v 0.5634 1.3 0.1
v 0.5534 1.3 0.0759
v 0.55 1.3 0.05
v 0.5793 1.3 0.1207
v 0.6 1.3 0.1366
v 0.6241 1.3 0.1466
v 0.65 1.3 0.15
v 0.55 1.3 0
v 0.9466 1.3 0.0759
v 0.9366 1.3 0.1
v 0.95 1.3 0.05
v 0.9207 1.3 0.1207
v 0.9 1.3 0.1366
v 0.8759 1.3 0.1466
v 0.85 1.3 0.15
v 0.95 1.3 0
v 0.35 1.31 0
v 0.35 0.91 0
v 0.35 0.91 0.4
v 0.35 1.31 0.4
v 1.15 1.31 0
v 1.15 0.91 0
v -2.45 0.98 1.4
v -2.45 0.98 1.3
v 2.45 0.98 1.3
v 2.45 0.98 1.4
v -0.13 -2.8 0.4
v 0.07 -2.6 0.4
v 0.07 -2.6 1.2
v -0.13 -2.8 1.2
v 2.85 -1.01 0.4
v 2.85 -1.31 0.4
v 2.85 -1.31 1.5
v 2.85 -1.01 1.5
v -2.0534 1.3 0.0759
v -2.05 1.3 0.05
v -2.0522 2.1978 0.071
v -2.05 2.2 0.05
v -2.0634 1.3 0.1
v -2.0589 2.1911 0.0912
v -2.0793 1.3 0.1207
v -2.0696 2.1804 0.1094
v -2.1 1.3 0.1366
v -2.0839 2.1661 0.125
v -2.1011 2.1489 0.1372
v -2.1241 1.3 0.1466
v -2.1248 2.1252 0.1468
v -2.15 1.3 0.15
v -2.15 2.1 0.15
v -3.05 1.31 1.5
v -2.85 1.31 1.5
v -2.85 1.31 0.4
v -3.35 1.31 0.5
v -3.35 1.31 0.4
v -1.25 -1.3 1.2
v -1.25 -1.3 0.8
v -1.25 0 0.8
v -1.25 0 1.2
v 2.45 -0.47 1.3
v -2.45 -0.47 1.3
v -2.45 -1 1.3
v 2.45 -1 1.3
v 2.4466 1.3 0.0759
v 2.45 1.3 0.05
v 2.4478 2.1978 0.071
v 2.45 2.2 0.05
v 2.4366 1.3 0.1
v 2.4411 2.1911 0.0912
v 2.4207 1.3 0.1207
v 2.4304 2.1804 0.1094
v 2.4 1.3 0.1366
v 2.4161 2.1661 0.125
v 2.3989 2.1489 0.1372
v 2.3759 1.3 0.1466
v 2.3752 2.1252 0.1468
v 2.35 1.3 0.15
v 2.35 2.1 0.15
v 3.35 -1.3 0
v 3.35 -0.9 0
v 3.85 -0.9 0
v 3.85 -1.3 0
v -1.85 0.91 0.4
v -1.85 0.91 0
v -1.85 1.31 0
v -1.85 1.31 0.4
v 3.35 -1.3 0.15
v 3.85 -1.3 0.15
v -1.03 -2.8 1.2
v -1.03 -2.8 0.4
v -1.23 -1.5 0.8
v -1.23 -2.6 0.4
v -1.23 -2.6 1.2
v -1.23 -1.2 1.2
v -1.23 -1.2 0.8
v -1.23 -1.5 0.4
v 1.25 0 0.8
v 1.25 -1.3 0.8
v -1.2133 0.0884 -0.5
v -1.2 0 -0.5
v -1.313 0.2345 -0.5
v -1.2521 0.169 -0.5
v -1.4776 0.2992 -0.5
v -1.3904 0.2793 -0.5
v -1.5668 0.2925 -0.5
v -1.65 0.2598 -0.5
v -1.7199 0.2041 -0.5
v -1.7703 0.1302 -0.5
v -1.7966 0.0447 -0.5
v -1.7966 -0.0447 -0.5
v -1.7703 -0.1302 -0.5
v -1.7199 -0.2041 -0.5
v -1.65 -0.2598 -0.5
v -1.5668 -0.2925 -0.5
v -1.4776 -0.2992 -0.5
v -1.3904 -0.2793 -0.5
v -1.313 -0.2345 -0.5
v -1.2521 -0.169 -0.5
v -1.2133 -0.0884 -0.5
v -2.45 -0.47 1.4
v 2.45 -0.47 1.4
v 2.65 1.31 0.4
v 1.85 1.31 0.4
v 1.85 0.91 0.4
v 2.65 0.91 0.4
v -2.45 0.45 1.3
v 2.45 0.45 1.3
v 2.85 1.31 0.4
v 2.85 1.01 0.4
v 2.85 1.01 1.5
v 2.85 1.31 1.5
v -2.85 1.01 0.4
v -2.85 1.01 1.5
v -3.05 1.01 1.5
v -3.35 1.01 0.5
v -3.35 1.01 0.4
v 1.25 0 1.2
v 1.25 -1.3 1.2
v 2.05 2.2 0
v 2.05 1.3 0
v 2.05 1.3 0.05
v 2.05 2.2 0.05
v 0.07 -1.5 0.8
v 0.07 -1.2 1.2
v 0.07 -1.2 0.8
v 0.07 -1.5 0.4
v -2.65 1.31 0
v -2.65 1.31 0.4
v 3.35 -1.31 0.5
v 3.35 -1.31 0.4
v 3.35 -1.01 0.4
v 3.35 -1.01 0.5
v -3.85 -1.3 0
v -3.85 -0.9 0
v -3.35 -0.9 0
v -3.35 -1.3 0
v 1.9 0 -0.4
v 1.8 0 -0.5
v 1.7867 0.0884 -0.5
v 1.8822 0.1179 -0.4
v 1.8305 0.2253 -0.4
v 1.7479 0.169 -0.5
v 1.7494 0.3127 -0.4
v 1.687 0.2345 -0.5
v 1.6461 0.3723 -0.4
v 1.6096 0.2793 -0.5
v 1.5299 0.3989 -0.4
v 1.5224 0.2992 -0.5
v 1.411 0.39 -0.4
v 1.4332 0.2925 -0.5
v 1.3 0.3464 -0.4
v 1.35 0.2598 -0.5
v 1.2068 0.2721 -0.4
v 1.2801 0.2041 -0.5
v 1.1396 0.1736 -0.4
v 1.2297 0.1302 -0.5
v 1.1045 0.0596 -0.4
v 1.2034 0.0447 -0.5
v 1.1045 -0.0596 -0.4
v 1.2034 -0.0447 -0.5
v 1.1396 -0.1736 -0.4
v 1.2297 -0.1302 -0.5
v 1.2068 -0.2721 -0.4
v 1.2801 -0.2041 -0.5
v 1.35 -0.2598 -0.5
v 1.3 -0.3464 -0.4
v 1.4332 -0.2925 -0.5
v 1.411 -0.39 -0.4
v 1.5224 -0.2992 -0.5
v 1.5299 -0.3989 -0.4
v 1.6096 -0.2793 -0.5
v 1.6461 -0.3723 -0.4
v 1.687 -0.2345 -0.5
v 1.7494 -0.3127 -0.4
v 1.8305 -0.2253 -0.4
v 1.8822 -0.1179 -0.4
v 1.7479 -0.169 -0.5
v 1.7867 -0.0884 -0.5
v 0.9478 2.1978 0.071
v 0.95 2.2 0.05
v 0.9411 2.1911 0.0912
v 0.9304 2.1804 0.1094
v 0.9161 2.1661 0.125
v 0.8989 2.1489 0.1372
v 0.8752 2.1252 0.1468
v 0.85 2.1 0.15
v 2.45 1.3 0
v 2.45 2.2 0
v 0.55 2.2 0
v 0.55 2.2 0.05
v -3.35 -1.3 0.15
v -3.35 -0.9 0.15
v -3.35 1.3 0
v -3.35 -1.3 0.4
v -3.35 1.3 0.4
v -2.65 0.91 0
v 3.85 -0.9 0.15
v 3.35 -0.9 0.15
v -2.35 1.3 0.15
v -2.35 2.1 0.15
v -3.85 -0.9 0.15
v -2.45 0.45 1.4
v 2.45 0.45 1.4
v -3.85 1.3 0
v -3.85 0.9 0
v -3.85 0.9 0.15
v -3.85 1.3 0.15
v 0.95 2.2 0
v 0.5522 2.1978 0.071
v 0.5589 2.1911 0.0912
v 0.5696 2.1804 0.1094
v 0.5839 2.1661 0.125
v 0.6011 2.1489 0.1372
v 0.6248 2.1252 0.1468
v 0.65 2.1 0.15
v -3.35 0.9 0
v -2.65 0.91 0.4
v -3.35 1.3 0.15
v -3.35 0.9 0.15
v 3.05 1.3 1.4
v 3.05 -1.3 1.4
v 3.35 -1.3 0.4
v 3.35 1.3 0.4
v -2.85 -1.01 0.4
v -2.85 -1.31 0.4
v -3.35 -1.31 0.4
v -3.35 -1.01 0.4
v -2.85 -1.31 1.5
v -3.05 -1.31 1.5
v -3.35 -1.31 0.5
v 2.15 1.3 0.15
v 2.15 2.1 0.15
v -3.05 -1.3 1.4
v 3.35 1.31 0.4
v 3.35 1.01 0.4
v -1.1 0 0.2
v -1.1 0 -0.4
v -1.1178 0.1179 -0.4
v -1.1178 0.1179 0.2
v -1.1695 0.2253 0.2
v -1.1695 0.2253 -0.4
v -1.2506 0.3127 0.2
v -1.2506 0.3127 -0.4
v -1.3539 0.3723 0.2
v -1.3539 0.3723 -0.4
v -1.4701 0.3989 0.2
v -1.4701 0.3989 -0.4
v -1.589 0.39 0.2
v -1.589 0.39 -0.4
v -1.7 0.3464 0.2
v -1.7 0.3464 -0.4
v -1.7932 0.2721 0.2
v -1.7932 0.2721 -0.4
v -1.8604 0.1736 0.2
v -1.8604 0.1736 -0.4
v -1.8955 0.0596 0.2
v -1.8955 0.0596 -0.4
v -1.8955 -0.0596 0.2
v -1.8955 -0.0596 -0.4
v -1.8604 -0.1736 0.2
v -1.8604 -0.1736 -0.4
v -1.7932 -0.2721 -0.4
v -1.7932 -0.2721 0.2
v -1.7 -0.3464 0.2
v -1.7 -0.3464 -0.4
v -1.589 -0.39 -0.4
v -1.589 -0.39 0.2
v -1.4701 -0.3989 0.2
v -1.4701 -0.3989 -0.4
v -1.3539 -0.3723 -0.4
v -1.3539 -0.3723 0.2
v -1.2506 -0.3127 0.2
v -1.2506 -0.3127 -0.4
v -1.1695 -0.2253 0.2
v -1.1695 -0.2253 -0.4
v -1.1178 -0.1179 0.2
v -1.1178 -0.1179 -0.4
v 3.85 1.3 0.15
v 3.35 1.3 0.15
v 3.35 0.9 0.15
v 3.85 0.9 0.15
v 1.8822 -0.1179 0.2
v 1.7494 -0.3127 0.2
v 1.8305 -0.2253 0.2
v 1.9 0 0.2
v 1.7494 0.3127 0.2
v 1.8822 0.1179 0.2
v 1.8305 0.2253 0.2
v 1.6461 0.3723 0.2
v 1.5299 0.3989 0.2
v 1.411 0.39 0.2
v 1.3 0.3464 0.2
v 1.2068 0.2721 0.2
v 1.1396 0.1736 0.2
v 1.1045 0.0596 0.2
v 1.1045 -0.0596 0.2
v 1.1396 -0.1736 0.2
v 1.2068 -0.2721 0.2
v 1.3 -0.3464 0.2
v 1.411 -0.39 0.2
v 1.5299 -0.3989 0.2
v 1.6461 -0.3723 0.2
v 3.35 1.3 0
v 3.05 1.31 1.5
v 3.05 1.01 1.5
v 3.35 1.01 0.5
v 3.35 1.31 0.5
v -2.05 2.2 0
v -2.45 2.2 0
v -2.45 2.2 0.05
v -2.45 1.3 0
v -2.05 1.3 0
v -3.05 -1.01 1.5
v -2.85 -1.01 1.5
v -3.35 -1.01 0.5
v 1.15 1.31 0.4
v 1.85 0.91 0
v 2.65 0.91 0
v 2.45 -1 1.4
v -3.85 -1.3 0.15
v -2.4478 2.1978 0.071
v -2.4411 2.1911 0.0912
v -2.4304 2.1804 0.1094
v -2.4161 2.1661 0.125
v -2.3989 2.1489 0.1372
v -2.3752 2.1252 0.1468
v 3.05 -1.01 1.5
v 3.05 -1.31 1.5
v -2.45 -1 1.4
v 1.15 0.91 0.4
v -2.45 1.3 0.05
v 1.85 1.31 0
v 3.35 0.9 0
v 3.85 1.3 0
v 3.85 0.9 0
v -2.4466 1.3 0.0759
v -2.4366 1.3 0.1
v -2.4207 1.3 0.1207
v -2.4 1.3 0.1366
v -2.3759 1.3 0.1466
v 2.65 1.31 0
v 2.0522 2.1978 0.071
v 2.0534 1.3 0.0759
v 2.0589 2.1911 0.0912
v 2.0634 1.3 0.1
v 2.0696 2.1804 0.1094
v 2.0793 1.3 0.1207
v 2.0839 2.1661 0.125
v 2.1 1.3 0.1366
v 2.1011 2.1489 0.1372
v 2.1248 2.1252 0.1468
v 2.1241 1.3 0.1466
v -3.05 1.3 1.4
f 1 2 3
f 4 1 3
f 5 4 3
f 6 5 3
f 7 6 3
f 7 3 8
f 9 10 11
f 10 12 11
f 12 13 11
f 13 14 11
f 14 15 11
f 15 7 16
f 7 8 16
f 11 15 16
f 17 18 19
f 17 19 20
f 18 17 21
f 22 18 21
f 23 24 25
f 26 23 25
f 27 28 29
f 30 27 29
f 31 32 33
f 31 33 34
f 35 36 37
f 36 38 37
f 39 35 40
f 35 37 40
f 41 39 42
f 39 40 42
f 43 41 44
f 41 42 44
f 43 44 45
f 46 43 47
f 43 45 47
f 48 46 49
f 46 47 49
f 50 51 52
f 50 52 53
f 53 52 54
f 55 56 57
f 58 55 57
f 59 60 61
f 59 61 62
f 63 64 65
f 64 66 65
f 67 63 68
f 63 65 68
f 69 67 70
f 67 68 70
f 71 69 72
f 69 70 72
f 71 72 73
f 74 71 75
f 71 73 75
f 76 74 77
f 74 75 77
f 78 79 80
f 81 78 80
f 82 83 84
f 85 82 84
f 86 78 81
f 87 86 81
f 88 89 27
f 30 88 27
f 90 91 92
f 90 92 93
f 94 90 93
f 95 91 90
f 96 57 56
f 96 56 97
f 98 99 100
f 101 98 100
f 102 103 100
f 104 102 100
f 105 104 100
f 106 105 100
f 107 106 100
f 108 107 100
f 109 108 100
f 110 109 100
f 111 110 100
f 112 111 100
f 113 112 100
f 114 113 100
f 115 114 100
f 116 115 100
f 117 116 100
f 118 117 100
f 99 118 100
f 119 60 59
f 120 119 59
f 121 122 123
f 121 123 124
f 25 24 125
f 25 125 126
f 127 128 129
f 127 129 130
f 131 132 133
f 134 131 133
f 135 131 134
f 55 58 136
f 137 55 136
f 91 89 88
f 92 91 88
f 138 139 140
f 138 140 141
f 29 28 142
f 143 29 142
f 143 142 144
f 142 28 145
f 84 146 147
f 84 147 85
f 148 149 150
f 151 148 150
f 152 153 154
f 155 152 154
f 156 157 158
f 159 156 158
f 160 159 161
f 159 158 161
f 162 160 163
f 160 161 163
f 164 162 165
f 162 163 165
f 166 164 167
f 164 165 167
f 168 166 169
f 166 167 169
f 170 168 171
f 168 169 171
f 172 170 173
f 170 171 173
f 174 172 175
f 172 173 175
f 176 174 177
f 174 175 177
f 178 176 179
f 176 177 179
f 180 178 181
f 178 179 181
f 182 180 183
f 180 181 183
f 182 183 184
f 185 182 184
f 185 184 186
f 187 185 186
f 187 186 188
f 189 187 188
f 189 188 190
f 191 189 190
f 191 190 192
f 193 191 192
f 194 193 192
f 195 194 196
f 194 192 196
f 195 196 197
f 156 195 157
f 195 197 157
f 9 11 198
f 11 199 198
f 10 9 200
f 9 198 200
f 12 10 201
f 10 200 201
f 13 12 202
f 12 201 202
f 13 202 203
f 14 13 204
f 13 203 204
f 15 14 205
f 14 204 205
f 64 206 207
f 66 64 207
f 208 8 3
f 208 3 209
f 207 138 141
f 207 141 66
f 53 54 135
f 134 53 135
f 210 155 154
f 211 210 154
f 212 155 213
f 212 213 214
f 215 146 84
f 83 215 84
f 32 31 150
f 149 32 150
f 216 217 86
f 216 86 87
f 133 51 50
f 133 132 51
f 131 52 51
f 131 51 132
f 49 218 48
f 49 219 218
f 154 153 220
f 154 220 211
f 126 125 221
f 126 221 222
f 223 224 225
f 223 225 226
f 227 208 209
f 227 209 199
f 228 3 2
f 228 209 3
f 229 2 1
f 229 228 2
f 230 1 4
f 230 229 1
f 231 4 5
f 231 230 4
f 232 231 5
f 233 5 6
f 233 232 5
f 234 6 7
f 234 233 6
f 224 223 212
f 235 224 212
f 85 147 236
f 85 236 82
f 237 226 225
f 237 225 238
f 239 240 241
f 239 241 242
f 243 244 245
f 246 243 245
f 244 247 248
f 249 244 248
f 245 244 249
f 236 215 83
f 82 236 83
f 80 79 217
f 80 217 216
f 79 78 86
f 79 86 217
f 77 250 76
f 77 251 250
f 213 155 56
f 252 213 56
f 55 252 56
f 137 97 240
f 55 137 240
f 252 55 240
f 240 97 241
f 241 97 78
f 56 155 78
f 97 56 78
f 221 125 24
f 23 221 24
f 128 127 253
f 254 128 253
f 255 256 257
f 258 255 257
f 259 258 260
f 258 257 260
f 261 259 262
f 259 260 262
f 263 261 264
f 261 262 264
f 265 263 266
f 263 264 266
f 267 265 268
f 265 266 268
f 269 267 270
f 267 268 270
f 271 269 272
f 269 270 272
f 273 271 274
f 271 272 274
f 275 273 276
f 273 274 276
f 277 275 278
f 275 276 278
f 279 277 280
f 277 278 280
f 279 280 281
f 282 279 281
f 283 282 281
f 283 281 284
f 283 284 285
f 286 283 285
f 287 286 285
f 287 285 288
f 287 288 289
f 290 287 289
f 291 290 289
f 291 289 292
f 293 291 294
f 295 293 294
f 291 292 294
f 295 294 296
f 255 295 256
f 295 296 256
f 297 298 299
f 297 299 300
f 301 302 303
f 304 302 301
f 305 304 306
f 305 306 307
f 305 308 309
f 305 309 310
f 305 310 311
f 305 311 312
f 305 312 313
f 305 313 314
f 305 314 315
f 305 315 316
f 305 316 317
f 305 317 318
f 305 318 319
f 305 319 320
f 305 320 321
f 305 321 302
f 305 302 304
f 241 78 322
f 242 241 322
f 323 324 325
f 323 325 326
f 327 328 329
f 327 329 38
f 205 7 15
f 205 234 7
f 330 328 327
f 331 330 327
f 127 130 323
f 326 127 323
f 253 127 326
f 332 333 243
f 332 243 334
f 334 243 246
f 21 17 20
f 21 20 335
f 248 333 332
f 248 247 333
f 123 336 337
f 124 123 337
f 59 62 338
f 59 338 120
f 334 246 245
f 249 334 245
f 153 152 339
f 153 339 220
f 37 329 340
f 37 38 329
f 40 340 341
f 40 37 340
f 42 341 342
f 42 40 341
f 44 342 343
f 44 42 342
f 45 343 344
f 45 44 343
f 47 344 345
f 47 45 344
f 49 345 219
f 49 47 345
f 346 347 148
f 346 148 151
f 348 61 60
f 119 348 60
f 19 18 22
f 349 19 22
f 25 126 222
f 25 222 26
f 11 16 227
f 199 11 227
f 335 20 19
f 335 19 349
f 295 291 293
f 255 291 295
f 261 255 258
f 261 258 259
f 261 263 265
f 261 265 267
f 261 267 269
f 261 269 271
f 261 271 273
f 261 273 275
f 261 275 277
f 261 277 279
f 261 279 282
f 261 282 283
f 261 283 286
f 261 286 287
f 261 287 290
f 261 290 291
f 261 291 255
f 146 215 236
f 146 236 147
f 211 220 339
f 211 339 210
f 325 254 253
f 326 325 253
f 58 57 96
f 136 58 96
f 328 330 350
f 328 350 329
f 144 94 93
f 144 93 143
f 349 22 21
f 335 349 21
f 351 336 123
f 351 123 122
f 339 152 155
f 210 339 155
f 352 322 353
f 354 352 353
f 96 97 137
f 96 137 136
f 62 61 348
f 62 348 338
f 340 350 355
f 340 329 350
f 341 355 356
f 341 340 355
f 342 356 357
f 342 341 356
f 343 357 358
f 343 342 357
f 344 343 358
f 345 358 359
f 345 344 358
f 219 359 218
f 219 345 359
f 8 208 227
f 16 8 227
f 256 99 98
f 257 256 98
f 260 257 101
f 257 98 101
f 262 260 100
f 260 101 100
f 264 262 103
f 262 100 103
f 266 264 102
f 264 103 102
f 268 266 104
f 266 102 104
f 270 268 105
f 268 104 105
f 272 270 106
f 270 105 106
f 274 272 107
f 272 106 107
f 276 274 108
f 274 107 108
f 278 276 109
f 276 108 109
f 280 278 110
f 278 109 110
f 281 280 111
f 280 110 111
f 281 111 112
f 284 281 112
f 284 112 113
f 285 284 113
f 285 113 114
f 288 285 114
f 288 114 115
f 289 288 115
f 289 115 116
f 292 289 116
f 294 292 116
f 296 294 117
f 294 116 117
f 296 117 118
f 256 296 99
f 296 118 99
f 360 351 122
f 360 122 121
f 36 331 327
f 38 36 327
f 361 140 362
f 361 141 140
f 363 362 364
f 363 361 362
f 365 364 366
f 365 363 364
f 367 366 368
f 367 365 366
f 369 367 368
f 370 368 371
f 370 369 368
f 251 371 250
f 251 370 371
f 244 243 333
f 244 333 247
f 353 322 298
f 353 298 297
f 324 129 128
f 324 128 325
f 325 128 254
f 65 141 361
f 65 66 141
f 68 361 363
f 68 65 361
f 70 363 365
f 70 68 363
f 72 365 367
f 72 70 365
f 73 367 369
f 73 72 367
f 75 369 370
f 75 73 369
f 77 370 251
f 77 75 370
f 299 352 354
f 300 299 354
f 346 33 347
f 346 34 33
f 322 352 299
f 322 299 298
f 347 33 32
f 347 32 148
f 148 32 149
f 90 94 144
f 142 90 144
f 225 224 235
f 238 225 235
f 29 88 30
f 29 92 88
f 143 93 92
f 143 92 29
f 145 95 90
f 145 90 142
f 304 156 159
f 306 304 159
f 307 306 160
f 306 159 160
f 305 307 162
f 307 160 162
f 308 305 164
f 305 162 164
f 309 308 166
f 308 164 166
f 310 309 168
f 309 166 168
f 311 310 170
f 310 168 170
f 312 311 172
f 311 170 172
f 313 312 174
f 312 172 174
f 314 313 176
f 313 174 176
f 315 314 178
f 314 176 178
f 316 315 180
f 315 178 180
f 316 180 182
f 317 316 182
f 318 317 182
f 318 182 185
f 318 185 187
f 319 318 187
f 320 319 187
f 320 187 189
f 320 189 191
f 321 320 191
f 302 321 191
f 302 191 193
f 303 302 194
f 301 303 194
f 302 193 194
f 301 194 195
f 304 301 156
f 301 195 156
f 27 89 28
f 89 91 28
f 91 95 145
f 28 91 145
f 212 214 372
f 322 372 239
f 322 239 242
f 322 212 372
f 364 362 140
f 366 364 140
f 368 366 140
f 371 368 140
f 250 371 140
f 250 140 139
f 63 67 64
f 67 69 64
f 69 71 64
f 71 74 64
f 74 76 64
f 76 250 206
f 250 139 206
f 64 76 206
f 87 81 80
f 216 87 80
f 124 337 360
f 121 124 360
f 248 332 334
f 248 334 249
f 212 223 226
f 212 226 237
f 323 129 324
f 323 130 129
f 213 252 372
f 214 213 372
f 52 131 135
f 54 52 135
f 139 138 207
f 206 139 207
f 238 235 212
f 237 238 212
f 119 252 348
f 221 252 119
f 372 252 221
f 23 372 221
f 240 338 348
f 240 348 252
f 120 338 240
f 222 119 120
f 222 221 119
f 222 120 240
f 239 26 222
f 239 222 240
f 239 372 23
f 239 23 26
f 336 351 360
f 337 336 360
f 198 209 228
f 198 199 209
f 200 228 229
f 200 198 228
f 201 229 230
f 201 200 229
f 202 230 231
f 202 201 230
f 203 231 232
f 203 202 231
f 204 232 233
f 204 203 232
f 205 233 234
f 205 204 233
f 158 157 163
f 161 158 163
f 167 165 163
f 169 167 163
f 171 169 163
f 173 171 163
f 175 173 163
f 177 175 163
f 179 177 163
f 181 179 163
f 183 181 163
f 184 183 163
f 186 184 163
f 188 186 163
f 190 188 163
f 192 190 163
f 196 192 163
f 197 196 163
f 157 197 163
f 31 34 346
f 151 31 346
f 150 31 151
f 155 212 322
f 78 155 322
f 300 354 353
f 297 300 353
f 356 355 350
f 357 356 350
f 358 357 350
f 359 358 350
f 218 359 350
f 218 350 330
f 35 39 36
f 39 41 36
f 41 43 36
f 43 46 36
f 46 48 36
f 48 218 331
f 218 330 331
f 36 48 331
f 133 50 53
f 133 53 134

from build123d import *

# Parameters (mm, degrees)
BOX002_W                   = 1.3
BOX002_H                   = 1.3
BOX002_DEPTH               = 0.8
CHAMFER_SIZE               = 0.2
CHAMFER001_SIZE            = 0.2
BOX001_W                   = 1.3
BOX001_H                   = 0.4
BOX001_DEPTH               = 0.4
CYLINDER_R                 = 0.4
CYLINDER_DEPTH             = 0.7
CHAMFER003_SIZE            = 0.1
CYLINDER001_R              = 0.4
CYLINDER001_DEPTH          = 0.7
CHAMFER004_SIZE            = 0.1
BOX005_W                   = 0.5
BOX005_H                   = 0.3
BOX005_DEPTH               = 1.1
CHAMFER005_SIZE2           = 0.3
CHAMFER005_SIZE            = 1
BOX006_W                   = 0.5
BOX006_H                   = 0.3
BOX006_DEPTH               = 1.1
CHAMFER006_SIZE2           = 0.3
CHAMFER006_SIZE            = 1
BOX007_W                   = 0.5
BOX007_H                   = 0.3
BOX007_DEPTH               = 1.1
CHAMFER007_SIZE2           = 0.3
CHAMFER007_SIZE            = 1
CHAMFER007_PLACEMENT_ANGLE = 180
BOX008_W                   = 0.5
BOX008_H                   = 0.3
BOX008_DEPTH               = 1.1
CHAMFER008_SIZE2           = 0.3
CHAMFER008_SIZE            = 1
CHAMFER008_PLACEMENT_ANGLE = 180
BOX009_W                   = 0.5
BOX009_H                   = 0.4
BOX009_DEPTH               = 0.15
BOX010_W                   = 0.5
BOX010_H                   = 0.4
BOX010_DEPTH               = 0.15
BOX011_W                   = 0.5
BOX011_H                   = 0.4
BOX011_DEPTH               = 0.15
BOX012_W                   = 0.5
BOX012_H                   = 0.4
BOX012_DEPTH               = 0.15
BOX016_W                   = 0.8
BOX016_H                   = 0.4
BOX016_DEPTH               = 0.4
BOX017_W                   = 0.8
BOX017_H                   = 0.4
BOX017_DEPTH               = 0.4
BOX018_W                   = 0.8
BOX018_H                   = 0.4
BOX018_DEPTH               = 0.4
BOX015_W                   = 0.4
BOX015_H                   = 0.9
BOX015_DEPTH               = 0.15
FILLET004_R                = 0.1
BOX013_W                   = 0.4
BOX013_H                   = 0.9
BOX013_DEPTH               = 0.15
FILLET005_R                = 0.1
BOX014_W                   = 0.4
BOX014_H                   = 0.9
BOX014_DEPTH               = 0.15
FILLET006_R                = 0.1
BOX019_W                   = 4.9
BOX019_H                   = 0.53
BOX019_DEPTH               = 0.2
BOX020_W                   = 4.9
BOX020_H                   = 0.53
BOX020_DEPTH               = 0.2
BOX_W                      = 2.5
BOX_H                      = 2
BOX_DEPTH                  = 0.4
SKETCH_W                   = 6.7
SKETCH_H                   = 2.6
PAD_DEPTH                  = 1.4
CHAMFER002_1_SIZE2         = 0.3
CHAMFER002_1_SIZE          = 1
CHAMFER002_2_SIZE2         = 0.3
CHAMFER002_2_SIZE          = 1


with BuildPart() as chamfer001:
    # Box002 → Box002 (new body)
    with BuildSketch(Plane(origin=(-0.08, -2.8, 0.4), x_dir=(1, 0, 0), z_dir=(0, 0, 1))):
        with Locations((0.65, 0.65)):
            Rectangle(BOX002_W, BOX002_H)
    extrude(amount=BOX002_DEPTH)

    # Chamfer
    chamfer_edges = [chamfer001.edges().sort_by_distance(p)[0] for p in [
        (-0.08, -2.8, 0.8),
    ]]
    chamfer(chamfer_edges, length=CHAMFER_SIZE)

    # Chamfer001
    chamfer001_edges = [chamfer001.edges().sort_by_distance(p)[0] for p in [
        (1.22, -2.8, 0.8),
    ]]
    chamfer(chamfer001_edges, length=CHAMFER001_SIZE)


with BuildPart() as fusion:
    # Box001 → Box001 (new body)
    with BuildSketch(Plane(origin=(-0.08, -1.6, 0.8), x_dir=(1, 0, 0), z_dir=(0, 0, 1))):
        with Locations((0.65, 0.2)):
            Rectangle(BOX001_W, BOX001_H)
    extrude(amount=BOX001_DEPTH)

    # Fusion: union Chamfer001
    add(chamfer001.part)


with BuildPart() as fusion_1:
    # Fusion placement: moved
    add(fusion.part.moved(Location((-1.15, 0, 0))))


with BuildPart() as pigunder001:
    # Cylinder → Cylinder (new body)
    with BuildSketch(Plane(origin=(1.5, 0, -0.5), x_dir=(1, 0, 0), z_dir=(0, 0, 1))):
        Circle(CYLINDER_R)
    extrude(amount=CYLINDER_DEPTH)

    # Chamfer003
    chamfer003_edges = [pigunder001.edges().sort_by_distance(p)[0] for p in [
        (1.1, 0, -0.5),
    ]]
    chamfer(chamfer003_edges, length=CHAMFER003_SIZE)


with BuildPart() as pigunder002:
    # Cylinder001 → Cylinder001 (new body)
    with BuildSketch(Plane(origin=(-1.5, 0, -0.5), x_dir=(1, 0, 0), z_dir=(0, 0, 1))):
        Circle(CYLINDER001_R)
    extrude(amount=CYLINDER001_DEPTH)

    # Chamfer004
    chamfer004_edges = [pigunder002.edges().sort_by_distance(p)[0] for p in [
        (-1.9, 0, -0.5),
    ]]
    chamfer(chamfer004_edges, length=CHAMFER004_SIZE)


with BuildPart() as corner001:
    # Box005 → Box005 (new body)
    with BuildSketch(Plane(origin=(2.85, -1.3, 0.4), x_dir=(1, 0, 0), z_dir=(0, 0, 1))):
        with Locations((0.25, 0.15)):
            Rectangle(BOX005_W, BOX005_H)
    extrude(amount=BOX005_DEPTH)

    # Chamfer005
    chamfer005_edges = [corner001.edges().sort_by_distance(p)[0] for p in [
        (3.35, -1.15, 1.5),
    ]]
    chamfer005_side = corner001.faces().sort_by_distance((3.35, -1.15, 0.95))[0]
    chamfer(chamfer005_edges, length=CHAMFER005_SIZE, length2=CHAMFER005_SIZE2, reference=chamfer005_side)


with BuildPart() as corner001_1:
    # Chamfer005 placement: moved
    add(corner001.part.moved(Location((0, -0.01, 0))))


with BuildPart() as corner002:
    # Box006 → Box006 (new body)
    with BuildSketch(Plane(origin=(2.85, -1.3, 0.4), x_dir=(1, 0, 0), z_dir=(0, 0, 1))):
        with Locations((0.25, 0.15)):
            Rectangle(BOX006_W, BOX006_H)
    extrude(amount=BOX006_DEPTH)

    # Chamfer006
    chamfer006_edges = [corner002.edges().sort_by_distance(p)[0] for p in [
        (3.35, -1.15, 1.5),
    ]]
    chamfer006_side = corner002.faces().sort_by_distance((3.35, -1.15, 0.95))[0]
    chamfer(chamfer006_edges, length=CHAMFER006_SIZE, length2=CHAMFER006_SIZE2, reference=chamfer006_side)


with BuildPart() as corner002_1:
    # Chamfer006 placement: moved
    add(corner002.part.moved(Location((0, 2.31, 0))))


with BuildPart() as corner003:
    # Box007 → Box007 (new body)
    with BuildSketch(Plane(origin=(2.85, -1.3, 0.4), x_dir=(1, 0, 0), z_dir=(0, 0, 1))):
        with Locations((0.25, 0.15)):
            Rectangle(BOX007_W, BOX007_H)
    extrude(amount=BOX007_DEPTH)

    # Chamfer007
    chamfer007_edges = [corner003.edges().sort_by_distance(p)[0] for p in [
        (3.35, -1.15, 1.5),
    ]]
    chamfer007_side = corner003.faces().sort_by_distance((3.35, -1.15, 0.95))[0]
    chamfer(chamfer007_edges, length=CHAMFER007_SIZE, length2=CHAMFER007_SIZE2, reference=chamfer007_side)


with BuildPart() as corner003_1:
    # Chamfer007 placement: moved
    add(corner003.part.moved(Location((0, 0.01, 0))).rotate(Axis((0, 0.01, 0), (0, 0, 1)), CHAMFER007_PLACEMENT_ANGLE))


with BuildPart() as corner004:
    # Box008 → Box008 (new body)
    with BuildSketch(Plane(origin=(2.85, -1.3, 0.4), x_dir=(1, 0, 0), z_dir=(0, 0, 1))):
        with Locations((0.25, 0.15)):
            Rectangle(BOX008_W, BOX008_H)
    extrude(amount=BOX008_DEPTH)

    # Chamfer008
    chamfer008_edges = [corner004.edges().sort_by_distance(p)[0] for p in [
        (3.35, -1.15, 1.5),
    ]]
    chamfer008_side = corner004.faces().sort_by_distance((3.35, -1.15, 0.95))[0]
    chamfer(chamfer008_edges, length=CHAMFER008_SIZE, length2=CHAMFER008_SIZE2, reference=chamfer008_side)


with BuildPart() as corner004_1:
    # Chamfer008 placement: moved
    add(corner004.part.moved(Location((0, -2.31, 0))).rotate(Axis((0, -2.31, 0), (0, 0, 1)), CHAMFER008_PLACEMENT_ANGLE))


with BuildPart() as leg001:
    # Box009 → Box009 (new body)
    with BuildSketch(Plane(origin=(3.35, -1.3, 0), x_dir=(1, 0, 0), z_dir=(0, 0, 1))):
        with Locations((0.25, 0.2)):
            Rectangle(BOX009_W, BOX009_H)
    extrude(amount=BOX009_DEPTH)


with BuildPart() as leg002:
    # Box010 → Box010 (new body)
    with BuildSketch(Plane(origin=(3.35, 0.9, 0), x_dir=(1, 0, 0), z_dir=(0, 0, 1))):
        with Locations((0.25, 0.2)):
            Rectangle(BOX010_W, BOX010_H)
    extrude(amount=BOX010_DEPTH)


with BuildPart() as leg003:
    # Box011 → Box011 (new body)
    with BuildSketch(Plane(origin=(-3.85, -1.3, 0), x_dir=(1, 0, 0), z_dir=(0, 0, 1))):
        with Locations((0.25, 0.2)):
            Rectangle(BOX011_W, BOX011_H)
    extrude(amount=BOX011_DEPTH)


with BuildPart() as leg004:
    # Box012 → Box012 (new body)
    with BuildSketch(Plane(origin=(-3.85, 0.9, 0), x_dir=(1, 0, 0), z_dir=(0, 0, 1))):
        with Locations((0.25, 0.2)):
            Rectangle(BOX012_W, BOX012_H)
    extrude(amount=BOX012_DEPTH)


with BuildPart() as kub009:
    # Box016 → Box016 (new body)
    with BuildSketch(Plane(origin=(1.85, 0.91, 0), x_dir=(1, 0, 0), z_dir=(0, 0, 1))):
        with Locations((0.4, 0.2)):
            Rectangle(BOX016_W, BOX016_H)
    extrude(amount=BOX016_DEPTH)


with BuildPart() as kub010:
    # Box017 → Box017 (new body)
    with BuildSketch(Plane(origin=(0.35, 0.91, 0), x_dir=(1, 0, 0), z_dir=(0, 0, 1))):
        with Locations((0.4, 0.2)):
            Rectangle(BOX017_W, BOX017_H)
    extrude(amount=BOX017_DEPTH)


with BuildPart() as kub011:
    # Box018 → Box018 (new body)
    with BuildSketch(Plane(origin=(-2.65, 0.91, 0), x_dir=(1, 0, 0), z_dir=(0, 0, 1))):
        with Locations((0.4, 0.2)):
            Rectangle(BOX018_W, BOX018_H)
    extrude(amount=BOX018_DEPTH)


with BuildPart() as fillet004:
    # Box015 → Box015 (new body)
    with BuildSketch(Plane(origin=(2.05, 1.3, 0), x_dir=(1, 0, 0), z_dir=(0, 0, 1))):
        with Locations((0.2, 0.45)):
            Rectangle(BOX015_W, BOX015_H)
    extrude(amount=BOX015_DEPTH)

    # Fillet004
    fillet004_edges = [fillet004.edges().sort_by_distance(p)[0] for p in [
        (2.05, 1.75, 0.15),
        (2.45, 1.75, 0.15),
        (2.25, 2.2, 0.15),
    ]]
    fillet(fillet004_edges, radius=FILLET004_R)


with BuildPart() as fillet005:
    # Box013 → Box013 (new body)
    with BuildSketch(Plane(origin=(-2.45, 1.3, 0), x_dir=(1, 0, 0), z_dir=(0, 0, 1))):
        with Locations((0.2, 0.45)):
            Rectangle(BOX013_W, BOX013_H)
    extrude(amount=BOX013_DEPTH)

    # Fillet005
    fillet005_edges = [fillet005.edges().sort_by_distance(p)[0] for p in [
        (-2.45, 1.75, 0.15),
        (-2.05, 1.75, 0.15),
        (-2.25, 2.2, 0.15),
    ]]
    fillet(fillet005_edges, radius=FILLET005_R)


with BuildPart() as fillet006:
    # Box014 → Box014 (new body)
    with BuildSketch(Plane(origin=(0.55, 1.3, 0), x_dir=(1, 0, 0), z_dir=(0, 0, 1))):
        with Locations((0.2, 0.45)):
            Rectangle(BOX014_W, BOX014_H)
    extrude(amount=BOX014_DEPTH)

    # Fillet006
    fillet006_edges = [fillet006.edges().sort_by_distance(p)[0] for p in [
        (0.55, 1.75, 0.15),
        (0.95, 1.75, 0.15),
        (0.75, 2.2, 0.15),
    ]]
    fillet(fillet006_edges, radius=FILLET006_R)


with BuildPart() as kub012:
    # Box019 → Box019 (new body)
    with BuildSketch(Plane(origin=(-2.45, 0.45, 1.3), x_dir=(1, 0, 0), z_dir=(0, 0, 1))):
        with Locations((2.45, 0.265)):
            Rectangle(BOX019_W, BOX019_H)
    extrude(amount=BOX019_DEPTH)


with BuildPart() as kub013:
    # Box020 → Box020 (new body)
    with BuildSketch(Plane(origin=(-2.45, -1, 1.3), x_dir=(1, 0, 0), z_dir=(0, 0, 1))):
        with Locations((2.45, 0.265)):
            Rectangle(BOX020_W, BOX020_H)
    extrude(amount=BOX020_DEPTH)


with BuildPart() as kub:
    # Box → Box (new body)
    with BuildSketch(Plane(origin=(-1.25, -2, 0.8), x_dir=(1, 0, 0), z_dir=(0, 0, 1))):
        with Locations((1.25, 1)):
            Rectangle(BOX_W, BOX_H)
    extrude(amount=BOX_DEPTH)


with BuildPart() as cut002:
    # Sketch → Pad (new body)
    with BuildSketch(Plane.XY):
        Rectangle(SKETCH_W, SKETCH_H)
    extrude(amount=PAD_DEPTH)

    # Cut: cut Kub
    add(kub.part, mode=Mode.SUBTRACT)

    # Chamfer002 1
    chamfer002_1_edges = [cut002.edges().sort_by_distance(p)[0] for p in [
        (3.35, 0, 1.4),
    ]]
    chamfer002_1_side = cut002.faces().sort_by_distance((3.35, 0, 0.7))[0]
    chamfer(chamfer002_1_edges, length=CHAMFER002_1_SIZE, length2=CHAMFER002_1_SIZE2, reference=chamfer002_1_side)

    # Chamfer002 2
    chamfer002_2_edges = [cut002.edges().sort_by_distance(p)[0] for p in [
        (-3.35, 0, 1.4),
    ]]
    chamfer002_2_side = cut002.faces().sort_by_distance((-3.35, 0, 0.7))[0]
    chamfer(chamfer002_2_edges, length=CHAMFER002_2_SIZE, length2=CHAMFER002_2_SIZE2, reference=chamfer002_2_side)

    # Cut001: cut Kub013
    add(kub013.part, mode=Mode.SUBTRACT)

    # Cut002: cut Kub012
    add(kub012.part, mode=Mode.SUBTRACT)


solid = Compound([fusion_1.part, pigunder001.part, pigunder002.part, corner001_1.part, corner002_1.part, corner003_1.part, corner004_1.part, leg001.part, leg002.part, leg003.part, leg004.part, kub009.part, kub010.part, kub011.part, fillet004.part, fillet005.part, fillet006.part, cut002.part])
